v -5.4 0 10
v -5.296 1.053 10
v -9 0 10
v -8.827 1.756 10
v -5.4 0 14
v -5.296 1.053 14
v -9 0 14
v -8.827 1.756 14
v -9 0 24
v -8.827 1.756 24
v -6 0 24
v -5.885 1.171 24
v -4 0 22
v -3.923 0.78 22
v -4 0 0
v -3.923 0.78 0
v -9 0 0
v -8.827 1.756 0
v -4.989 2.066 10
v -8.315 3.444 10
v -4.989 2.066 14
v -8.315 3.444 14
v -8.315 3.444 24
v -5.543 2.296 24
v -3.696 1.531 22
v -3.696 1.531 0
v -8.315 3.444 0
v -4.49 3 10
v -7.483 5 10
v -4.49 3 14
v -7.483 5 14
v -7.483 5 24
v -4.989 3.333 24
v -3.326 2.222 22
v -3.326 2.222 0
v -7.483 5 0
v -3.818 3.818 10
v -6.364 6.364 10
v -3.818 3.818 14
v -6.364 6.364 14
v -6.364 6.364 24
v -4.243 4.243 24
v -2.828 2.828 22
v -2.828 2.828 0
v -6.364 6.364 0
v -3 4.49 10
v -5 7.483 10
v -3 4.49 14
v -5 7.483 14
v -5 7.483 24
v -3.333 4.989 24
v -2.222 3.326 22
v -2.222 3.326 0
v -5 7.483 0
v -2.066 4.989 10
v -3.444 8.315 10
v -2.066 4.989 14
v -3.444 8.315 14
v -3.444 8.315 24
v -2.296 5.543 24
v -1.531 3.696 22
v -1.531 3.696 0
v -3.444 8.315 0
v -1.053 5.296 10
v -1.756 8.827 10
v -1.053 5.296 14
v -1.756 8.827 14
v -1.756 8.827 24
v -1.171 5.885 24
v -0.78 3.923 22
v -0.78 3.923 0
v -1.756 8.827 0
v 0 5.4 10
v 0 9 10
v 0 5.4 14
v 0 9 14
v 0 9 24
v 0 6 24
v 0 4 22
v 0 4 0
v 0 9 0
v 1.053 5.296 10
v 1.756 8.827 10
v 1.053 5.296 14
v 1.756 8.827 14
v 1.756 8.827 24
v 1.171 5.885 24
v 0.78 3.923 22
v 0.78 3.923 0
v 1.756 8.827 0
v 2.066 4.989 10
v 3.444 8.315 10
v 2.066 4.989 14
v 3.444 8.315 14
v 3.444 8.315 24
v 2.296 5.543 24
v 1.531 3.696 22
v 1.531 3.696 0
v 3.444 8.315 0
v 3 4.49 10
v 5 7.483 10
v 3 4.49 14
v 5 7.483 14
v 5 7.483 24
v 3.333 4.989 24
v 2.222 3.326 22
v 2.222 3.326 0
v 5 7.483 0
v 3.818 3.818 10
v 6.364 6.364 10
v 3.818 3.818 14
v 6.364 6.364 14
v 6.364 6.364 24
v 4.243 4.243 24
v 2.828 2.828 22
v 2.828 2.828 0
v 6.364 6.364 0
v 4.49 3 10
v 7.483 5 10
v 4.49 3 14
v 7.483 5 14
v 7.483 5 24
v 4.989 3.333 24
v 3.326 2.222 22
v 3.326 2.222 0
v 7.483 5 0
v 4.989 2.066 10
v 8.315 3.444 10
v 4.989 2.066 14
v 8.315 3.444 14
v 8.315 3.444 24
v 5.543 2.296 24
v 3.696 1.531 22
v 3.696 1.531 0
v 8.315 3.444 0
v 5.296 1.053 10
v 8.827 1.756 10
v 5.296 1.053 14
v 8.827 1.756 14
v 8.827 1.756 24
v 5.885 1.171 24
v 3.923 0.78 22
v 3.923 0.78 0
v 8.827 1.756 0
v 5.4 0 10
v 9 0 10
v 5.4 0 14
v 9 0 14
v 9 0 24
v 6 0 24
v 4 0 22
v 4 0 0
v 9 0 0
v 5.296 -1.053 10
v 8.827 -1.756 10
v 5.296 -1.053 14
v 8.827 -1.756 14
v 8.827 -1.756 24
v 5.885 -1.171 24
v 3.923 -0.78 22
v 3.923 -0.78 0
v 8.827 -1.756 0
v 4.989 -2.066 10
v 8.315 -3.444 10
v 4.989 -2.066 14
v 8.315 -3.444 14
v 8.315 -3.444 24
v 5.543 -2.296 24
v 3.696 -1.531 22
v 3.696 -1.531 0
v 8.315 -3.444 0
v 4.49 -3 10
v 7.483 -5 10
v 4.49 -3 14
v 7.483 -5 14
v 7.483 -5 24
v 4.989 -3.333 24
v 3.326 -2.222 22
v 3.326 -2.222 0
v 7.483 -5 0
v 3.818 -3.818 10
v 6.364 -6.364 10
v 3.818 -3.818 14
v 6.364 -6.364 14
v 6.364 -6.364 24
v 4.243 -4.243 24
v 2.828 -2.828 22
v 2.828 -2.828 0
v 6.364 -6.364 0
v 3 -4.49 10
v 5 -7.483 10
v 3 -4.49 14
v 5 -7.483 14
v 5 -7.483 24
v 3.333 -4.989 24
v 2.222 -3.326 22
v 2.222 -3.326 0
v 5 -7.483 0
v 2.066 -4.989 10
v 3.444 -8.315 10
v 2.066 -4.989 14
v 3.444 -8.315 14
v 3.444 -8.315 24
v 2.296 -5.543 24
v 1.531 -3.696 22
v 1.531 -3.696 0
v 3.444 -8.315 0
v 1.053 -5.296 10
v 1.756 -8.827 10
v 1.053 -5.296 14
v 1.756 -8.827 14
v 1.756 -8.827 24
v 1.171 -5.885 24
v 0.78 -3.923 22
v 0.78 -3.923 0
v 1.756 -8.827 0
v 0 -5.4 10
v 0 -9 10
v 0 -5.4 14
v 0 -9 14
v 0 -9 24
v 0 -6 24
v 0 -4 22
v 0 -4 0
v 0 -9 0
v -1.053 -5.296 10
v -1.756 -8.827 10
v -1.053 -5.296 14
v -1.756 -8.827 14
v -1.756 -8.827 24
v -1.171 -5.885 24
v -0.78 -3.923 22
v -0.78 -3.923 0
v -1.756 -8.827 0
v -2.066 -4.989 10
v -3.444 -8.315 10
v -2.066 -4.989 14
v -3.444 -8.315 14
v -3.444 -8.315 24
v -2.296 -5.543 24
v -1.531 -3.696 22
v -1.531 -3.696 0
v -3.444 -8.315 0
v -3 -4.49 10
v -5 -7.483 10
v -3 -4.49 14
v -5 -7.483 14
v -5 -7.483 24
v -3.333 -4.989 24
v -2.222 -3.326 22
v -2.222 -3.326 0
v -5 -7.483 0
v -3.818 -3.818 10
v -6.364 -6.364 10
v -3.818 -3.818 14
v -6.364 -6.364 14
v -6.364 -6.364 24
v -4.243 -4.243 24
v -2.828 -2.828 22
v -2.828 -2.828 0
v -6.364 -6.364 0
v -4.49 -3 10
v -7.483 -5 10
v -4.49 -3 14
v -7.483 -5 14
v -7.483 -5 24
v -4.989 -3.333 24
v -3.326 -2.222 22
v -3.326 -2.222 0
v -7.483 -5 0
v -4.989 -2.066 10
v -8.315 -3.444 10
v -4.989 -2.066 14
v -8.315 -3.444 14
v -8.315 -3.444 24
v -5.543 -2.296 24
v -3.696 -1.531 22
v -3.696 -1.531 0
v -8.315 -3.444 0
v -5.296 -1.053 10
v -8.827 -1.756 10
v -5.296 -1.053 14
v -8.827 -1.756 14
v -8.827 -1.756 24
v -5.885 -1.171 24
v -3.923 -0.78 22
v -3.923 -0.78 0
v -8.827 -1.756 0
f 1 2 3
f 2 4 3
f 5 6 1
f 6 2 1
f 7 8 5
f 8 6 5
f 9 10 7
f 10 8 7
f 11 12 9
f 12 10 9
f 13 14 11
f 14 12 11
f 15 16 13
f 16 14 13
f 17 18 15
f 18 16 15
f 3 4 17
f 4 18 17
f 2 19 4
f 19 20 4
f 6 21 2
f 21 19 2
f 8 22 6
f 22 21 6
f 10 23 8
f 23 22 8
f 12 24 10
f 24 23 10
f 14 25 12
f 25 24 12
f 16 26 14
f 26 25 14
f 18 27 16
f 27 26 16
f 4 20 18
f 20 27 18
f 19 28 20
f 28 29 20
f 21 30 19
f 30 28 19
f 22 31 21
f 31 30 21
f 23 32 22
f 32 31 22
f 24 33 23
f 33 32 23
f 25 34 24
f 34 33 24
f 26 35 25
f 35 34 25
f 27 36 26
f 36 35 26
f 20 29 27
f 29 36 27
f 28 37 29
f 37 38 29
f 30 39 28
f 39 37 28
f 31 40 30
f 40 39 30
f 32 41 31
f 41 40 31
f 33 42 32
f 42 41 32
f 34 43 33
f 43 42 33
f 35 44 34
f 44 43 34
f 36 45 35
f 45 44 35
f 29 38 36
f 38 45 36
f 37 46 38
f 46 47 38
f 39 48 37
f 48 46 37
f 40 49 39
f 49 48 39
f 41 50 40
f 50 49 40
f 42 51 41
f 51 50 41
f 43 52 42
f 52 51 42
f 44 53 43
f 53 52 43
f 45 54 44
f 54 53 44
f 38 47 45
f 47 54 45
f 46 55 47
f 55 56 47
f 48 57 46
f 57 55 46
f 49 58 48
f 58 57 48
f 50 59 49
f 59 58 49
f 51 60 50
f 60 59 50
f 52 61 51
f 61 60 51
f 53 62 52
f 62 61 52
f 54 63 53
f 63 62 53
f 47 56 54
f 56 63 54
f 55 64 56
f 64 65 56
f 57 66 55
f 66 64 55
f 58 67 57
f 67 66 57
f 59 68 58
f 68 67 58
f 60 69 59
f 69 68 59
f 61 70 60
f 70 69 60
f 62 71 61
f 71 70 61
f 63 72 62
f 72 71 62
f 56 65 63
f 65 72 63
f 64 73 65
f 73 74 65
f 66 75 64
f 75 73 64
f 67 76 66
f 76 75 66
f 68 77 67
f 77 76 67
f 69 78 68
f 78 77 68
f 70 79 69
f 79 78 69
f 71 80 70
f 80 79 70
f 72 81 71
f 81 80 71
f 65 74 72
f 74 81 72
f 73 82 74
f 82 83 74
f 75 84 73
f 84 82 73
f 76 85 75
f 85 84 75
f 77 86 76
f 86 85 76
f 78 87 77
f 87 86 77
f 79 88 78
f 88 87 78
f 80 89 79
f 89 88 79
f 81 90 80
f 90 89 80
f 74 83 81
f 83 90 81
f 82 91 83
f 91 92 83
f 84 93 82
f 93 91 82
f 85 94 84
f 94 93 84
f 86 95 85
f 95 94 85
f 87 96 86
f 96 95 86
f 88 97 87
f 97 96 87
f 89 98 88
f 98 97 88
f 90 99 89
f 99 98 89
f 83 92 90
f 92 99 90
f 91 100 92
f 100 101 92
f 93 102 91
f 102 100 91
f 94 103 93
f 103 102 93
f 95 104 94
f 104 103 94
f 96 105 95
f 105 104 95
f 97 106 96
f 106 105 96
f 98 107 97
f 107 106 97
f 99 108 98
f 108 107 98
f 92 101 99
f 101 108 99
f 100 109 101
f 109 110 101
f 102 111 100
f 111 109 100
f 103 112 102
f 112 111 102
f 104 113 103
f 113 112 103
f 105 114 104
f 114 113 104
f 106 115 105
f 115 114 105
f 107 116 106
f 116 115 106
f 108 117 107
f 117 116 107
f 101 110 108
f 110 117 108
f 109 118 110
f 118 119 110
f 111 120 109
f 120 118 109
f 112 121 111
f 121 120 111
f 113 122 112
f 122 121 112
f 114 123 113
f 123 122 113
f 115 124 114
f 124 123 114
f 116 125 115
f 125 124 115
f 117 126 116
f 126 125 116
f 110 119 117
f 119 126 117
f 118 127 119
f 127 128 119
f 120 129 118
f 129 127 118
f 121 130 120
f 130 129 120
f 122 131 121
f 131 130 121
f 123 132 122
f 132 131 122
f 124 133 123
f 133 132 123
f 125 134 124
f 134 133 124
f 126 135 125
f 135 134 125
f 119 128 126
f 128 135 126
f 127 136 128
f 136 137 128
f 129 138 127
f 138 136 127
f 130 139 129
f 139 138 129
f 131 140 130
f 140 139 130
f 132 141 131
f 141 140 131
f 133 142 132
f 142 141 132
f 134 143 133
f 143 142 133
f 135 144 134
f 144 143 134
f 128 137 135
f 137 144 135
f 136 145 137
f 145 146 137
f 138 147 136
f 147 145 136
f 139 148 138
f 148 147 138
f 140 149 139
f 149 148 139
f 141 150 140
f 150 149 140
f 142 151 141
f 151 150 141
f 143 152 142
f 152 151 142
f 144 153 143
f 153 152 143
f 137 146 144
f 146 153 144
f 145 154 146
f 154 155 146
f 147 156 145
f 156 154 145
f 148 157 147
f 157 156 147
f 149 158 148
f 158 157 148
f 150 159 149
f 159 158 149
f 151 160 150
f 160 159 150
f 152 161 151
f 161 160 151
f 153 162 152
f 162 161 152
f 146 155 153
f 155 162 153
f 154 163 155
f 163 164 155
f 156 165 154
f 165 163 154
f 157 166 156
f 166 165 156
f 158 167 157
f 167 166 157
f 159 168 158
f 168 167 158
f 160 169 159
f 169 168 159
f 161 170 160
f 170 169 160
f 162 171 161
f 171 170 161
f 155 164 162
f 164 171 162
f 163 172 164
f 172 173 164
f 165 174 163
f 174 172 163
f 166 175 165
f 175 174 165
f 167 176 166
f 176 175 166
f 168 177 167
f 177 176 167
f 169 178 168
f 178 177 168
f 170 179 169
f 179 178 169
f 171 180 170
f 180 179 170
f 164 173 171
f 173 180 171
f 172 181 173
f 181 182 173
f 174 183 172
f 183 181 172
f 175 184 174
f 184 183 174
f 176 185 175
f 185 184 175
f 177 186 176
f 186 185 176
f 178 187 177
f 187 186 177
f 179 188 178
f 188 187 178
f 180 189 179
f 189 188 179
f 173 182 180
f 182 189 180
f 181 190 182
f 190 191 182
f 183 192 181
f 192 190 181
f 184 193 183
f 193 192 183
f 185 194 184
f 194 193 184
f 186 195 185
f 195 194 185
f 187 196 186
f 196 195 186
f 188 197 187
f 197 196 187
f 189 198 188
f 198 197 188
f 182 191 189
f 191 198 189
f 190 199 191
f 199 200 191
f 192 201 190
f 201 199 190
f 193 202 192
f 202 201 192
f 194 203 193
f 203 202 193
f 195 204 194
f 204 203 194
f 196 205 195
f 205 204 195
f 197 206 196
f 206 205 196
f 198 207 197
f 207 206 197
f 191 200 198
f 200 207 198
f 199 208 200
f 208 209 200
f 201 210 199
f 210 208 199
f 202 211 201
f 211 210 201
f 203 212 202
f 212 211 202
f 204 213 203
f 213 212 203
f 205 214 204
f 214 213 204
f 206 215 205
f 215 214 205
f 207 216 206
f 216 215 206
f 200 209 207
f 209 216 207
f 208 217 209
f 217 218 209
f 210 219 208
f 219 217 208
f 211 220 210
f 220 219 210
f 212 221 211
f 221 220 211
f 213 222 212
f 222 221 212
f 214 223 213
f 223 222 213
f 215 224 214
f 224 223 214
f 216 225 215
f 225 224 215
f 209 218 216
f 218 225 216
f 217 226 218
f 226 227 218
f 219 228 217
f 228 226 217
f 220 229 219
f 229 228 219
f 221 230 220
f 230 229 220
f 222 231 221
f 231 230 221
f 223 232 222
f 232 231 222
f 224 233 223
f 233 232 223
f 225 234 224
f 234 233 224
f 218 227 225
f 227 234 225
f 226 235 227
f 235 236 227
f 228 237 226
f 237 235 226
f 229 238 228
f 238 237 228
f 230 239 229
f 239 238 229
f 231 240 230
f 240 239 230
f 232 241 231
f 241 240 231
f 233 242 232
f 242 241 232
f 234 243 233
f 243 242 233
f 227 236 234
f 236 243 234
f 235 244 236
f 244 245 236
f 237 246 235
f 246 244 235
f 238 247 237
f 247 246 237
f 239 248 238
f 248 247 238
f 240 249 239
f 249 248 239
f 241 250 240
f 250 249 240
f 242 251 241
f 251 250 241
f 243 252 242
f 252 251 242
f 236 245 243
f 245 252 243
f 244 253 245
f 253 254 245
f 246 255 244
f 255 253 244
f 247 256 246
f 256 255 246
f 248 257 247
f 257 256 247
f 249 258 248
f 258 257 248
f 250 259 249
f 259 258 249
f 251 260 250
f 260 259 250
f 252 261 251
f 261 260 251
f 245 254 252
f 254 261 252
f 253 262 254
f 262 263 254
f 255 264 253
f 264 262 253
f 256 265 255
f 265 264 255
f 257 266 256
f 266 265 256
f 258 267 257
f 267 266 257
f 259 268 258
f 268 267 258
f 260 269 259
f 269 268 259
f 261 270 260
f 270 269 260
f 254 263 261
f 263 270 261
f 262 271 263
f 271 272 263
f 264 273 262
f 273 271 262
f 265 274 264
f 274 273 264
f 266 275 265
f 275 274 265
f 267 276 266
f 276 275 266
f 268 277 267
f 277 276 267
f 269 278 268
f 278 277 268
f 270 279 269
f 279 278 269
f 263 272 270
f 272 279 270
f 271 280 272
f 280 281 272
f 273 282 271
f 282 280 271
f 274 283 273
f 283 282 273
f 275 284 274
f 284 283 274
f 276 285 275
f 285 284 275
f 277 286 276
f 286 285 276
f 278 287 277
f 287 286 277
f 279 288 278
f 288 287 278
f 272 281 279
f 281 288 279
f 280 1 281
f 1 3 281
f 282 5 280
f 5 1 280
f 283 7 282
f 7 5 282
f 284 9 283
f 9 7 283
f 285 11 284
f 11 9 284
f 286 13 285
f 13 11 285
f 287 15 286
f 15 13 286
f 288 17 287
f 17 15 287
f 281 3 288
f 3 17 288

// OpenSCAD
$fn = 32;

// ----------------------------------------------------------------------
// Grooved revolve: thread_relief, bore R4
// ----------------------------------------------------------------------

// --- parameters (mm) ---
bore_r = 4;               // bore radius
outer_r = 9;              // outer radius of the body
total_h = 24;             // overall height, Z
wall = 5;                 // radial wall thickness
groove_w = 4;             // groove width
groove_d = 3.6;           // groove depth
grooves = 1;              // number of outer grooves
relief = 2;               // thread relief leg at the bore mouth
relief_angle = 45;        // thread relief chamfer angle, degrees
fit_tol = 0.02;           // declared fit tolerance (prompt contract)
free_tol = 0.2;           // declared free tolerance (prompt contract)

bbox_x = 2 * outer_r;  // full diameter
bore_d = 2 * bore_r;  // bore diameter
body_d = 2 * outer_r;  // body diameter
revolve_angle = 360;  // full turn around the Z axis

profile = [[4, 0], [9, 0], [9, 10], [5.4, 10], [5.4, 14], [9, 14], [9, 24], [6, 24], [4, 22]];  // primary outline, 9 points, counter clockwise

// --- the one profile operation ---
rotate_extrude(angle = revolve_angle) polygon(points = profile);
